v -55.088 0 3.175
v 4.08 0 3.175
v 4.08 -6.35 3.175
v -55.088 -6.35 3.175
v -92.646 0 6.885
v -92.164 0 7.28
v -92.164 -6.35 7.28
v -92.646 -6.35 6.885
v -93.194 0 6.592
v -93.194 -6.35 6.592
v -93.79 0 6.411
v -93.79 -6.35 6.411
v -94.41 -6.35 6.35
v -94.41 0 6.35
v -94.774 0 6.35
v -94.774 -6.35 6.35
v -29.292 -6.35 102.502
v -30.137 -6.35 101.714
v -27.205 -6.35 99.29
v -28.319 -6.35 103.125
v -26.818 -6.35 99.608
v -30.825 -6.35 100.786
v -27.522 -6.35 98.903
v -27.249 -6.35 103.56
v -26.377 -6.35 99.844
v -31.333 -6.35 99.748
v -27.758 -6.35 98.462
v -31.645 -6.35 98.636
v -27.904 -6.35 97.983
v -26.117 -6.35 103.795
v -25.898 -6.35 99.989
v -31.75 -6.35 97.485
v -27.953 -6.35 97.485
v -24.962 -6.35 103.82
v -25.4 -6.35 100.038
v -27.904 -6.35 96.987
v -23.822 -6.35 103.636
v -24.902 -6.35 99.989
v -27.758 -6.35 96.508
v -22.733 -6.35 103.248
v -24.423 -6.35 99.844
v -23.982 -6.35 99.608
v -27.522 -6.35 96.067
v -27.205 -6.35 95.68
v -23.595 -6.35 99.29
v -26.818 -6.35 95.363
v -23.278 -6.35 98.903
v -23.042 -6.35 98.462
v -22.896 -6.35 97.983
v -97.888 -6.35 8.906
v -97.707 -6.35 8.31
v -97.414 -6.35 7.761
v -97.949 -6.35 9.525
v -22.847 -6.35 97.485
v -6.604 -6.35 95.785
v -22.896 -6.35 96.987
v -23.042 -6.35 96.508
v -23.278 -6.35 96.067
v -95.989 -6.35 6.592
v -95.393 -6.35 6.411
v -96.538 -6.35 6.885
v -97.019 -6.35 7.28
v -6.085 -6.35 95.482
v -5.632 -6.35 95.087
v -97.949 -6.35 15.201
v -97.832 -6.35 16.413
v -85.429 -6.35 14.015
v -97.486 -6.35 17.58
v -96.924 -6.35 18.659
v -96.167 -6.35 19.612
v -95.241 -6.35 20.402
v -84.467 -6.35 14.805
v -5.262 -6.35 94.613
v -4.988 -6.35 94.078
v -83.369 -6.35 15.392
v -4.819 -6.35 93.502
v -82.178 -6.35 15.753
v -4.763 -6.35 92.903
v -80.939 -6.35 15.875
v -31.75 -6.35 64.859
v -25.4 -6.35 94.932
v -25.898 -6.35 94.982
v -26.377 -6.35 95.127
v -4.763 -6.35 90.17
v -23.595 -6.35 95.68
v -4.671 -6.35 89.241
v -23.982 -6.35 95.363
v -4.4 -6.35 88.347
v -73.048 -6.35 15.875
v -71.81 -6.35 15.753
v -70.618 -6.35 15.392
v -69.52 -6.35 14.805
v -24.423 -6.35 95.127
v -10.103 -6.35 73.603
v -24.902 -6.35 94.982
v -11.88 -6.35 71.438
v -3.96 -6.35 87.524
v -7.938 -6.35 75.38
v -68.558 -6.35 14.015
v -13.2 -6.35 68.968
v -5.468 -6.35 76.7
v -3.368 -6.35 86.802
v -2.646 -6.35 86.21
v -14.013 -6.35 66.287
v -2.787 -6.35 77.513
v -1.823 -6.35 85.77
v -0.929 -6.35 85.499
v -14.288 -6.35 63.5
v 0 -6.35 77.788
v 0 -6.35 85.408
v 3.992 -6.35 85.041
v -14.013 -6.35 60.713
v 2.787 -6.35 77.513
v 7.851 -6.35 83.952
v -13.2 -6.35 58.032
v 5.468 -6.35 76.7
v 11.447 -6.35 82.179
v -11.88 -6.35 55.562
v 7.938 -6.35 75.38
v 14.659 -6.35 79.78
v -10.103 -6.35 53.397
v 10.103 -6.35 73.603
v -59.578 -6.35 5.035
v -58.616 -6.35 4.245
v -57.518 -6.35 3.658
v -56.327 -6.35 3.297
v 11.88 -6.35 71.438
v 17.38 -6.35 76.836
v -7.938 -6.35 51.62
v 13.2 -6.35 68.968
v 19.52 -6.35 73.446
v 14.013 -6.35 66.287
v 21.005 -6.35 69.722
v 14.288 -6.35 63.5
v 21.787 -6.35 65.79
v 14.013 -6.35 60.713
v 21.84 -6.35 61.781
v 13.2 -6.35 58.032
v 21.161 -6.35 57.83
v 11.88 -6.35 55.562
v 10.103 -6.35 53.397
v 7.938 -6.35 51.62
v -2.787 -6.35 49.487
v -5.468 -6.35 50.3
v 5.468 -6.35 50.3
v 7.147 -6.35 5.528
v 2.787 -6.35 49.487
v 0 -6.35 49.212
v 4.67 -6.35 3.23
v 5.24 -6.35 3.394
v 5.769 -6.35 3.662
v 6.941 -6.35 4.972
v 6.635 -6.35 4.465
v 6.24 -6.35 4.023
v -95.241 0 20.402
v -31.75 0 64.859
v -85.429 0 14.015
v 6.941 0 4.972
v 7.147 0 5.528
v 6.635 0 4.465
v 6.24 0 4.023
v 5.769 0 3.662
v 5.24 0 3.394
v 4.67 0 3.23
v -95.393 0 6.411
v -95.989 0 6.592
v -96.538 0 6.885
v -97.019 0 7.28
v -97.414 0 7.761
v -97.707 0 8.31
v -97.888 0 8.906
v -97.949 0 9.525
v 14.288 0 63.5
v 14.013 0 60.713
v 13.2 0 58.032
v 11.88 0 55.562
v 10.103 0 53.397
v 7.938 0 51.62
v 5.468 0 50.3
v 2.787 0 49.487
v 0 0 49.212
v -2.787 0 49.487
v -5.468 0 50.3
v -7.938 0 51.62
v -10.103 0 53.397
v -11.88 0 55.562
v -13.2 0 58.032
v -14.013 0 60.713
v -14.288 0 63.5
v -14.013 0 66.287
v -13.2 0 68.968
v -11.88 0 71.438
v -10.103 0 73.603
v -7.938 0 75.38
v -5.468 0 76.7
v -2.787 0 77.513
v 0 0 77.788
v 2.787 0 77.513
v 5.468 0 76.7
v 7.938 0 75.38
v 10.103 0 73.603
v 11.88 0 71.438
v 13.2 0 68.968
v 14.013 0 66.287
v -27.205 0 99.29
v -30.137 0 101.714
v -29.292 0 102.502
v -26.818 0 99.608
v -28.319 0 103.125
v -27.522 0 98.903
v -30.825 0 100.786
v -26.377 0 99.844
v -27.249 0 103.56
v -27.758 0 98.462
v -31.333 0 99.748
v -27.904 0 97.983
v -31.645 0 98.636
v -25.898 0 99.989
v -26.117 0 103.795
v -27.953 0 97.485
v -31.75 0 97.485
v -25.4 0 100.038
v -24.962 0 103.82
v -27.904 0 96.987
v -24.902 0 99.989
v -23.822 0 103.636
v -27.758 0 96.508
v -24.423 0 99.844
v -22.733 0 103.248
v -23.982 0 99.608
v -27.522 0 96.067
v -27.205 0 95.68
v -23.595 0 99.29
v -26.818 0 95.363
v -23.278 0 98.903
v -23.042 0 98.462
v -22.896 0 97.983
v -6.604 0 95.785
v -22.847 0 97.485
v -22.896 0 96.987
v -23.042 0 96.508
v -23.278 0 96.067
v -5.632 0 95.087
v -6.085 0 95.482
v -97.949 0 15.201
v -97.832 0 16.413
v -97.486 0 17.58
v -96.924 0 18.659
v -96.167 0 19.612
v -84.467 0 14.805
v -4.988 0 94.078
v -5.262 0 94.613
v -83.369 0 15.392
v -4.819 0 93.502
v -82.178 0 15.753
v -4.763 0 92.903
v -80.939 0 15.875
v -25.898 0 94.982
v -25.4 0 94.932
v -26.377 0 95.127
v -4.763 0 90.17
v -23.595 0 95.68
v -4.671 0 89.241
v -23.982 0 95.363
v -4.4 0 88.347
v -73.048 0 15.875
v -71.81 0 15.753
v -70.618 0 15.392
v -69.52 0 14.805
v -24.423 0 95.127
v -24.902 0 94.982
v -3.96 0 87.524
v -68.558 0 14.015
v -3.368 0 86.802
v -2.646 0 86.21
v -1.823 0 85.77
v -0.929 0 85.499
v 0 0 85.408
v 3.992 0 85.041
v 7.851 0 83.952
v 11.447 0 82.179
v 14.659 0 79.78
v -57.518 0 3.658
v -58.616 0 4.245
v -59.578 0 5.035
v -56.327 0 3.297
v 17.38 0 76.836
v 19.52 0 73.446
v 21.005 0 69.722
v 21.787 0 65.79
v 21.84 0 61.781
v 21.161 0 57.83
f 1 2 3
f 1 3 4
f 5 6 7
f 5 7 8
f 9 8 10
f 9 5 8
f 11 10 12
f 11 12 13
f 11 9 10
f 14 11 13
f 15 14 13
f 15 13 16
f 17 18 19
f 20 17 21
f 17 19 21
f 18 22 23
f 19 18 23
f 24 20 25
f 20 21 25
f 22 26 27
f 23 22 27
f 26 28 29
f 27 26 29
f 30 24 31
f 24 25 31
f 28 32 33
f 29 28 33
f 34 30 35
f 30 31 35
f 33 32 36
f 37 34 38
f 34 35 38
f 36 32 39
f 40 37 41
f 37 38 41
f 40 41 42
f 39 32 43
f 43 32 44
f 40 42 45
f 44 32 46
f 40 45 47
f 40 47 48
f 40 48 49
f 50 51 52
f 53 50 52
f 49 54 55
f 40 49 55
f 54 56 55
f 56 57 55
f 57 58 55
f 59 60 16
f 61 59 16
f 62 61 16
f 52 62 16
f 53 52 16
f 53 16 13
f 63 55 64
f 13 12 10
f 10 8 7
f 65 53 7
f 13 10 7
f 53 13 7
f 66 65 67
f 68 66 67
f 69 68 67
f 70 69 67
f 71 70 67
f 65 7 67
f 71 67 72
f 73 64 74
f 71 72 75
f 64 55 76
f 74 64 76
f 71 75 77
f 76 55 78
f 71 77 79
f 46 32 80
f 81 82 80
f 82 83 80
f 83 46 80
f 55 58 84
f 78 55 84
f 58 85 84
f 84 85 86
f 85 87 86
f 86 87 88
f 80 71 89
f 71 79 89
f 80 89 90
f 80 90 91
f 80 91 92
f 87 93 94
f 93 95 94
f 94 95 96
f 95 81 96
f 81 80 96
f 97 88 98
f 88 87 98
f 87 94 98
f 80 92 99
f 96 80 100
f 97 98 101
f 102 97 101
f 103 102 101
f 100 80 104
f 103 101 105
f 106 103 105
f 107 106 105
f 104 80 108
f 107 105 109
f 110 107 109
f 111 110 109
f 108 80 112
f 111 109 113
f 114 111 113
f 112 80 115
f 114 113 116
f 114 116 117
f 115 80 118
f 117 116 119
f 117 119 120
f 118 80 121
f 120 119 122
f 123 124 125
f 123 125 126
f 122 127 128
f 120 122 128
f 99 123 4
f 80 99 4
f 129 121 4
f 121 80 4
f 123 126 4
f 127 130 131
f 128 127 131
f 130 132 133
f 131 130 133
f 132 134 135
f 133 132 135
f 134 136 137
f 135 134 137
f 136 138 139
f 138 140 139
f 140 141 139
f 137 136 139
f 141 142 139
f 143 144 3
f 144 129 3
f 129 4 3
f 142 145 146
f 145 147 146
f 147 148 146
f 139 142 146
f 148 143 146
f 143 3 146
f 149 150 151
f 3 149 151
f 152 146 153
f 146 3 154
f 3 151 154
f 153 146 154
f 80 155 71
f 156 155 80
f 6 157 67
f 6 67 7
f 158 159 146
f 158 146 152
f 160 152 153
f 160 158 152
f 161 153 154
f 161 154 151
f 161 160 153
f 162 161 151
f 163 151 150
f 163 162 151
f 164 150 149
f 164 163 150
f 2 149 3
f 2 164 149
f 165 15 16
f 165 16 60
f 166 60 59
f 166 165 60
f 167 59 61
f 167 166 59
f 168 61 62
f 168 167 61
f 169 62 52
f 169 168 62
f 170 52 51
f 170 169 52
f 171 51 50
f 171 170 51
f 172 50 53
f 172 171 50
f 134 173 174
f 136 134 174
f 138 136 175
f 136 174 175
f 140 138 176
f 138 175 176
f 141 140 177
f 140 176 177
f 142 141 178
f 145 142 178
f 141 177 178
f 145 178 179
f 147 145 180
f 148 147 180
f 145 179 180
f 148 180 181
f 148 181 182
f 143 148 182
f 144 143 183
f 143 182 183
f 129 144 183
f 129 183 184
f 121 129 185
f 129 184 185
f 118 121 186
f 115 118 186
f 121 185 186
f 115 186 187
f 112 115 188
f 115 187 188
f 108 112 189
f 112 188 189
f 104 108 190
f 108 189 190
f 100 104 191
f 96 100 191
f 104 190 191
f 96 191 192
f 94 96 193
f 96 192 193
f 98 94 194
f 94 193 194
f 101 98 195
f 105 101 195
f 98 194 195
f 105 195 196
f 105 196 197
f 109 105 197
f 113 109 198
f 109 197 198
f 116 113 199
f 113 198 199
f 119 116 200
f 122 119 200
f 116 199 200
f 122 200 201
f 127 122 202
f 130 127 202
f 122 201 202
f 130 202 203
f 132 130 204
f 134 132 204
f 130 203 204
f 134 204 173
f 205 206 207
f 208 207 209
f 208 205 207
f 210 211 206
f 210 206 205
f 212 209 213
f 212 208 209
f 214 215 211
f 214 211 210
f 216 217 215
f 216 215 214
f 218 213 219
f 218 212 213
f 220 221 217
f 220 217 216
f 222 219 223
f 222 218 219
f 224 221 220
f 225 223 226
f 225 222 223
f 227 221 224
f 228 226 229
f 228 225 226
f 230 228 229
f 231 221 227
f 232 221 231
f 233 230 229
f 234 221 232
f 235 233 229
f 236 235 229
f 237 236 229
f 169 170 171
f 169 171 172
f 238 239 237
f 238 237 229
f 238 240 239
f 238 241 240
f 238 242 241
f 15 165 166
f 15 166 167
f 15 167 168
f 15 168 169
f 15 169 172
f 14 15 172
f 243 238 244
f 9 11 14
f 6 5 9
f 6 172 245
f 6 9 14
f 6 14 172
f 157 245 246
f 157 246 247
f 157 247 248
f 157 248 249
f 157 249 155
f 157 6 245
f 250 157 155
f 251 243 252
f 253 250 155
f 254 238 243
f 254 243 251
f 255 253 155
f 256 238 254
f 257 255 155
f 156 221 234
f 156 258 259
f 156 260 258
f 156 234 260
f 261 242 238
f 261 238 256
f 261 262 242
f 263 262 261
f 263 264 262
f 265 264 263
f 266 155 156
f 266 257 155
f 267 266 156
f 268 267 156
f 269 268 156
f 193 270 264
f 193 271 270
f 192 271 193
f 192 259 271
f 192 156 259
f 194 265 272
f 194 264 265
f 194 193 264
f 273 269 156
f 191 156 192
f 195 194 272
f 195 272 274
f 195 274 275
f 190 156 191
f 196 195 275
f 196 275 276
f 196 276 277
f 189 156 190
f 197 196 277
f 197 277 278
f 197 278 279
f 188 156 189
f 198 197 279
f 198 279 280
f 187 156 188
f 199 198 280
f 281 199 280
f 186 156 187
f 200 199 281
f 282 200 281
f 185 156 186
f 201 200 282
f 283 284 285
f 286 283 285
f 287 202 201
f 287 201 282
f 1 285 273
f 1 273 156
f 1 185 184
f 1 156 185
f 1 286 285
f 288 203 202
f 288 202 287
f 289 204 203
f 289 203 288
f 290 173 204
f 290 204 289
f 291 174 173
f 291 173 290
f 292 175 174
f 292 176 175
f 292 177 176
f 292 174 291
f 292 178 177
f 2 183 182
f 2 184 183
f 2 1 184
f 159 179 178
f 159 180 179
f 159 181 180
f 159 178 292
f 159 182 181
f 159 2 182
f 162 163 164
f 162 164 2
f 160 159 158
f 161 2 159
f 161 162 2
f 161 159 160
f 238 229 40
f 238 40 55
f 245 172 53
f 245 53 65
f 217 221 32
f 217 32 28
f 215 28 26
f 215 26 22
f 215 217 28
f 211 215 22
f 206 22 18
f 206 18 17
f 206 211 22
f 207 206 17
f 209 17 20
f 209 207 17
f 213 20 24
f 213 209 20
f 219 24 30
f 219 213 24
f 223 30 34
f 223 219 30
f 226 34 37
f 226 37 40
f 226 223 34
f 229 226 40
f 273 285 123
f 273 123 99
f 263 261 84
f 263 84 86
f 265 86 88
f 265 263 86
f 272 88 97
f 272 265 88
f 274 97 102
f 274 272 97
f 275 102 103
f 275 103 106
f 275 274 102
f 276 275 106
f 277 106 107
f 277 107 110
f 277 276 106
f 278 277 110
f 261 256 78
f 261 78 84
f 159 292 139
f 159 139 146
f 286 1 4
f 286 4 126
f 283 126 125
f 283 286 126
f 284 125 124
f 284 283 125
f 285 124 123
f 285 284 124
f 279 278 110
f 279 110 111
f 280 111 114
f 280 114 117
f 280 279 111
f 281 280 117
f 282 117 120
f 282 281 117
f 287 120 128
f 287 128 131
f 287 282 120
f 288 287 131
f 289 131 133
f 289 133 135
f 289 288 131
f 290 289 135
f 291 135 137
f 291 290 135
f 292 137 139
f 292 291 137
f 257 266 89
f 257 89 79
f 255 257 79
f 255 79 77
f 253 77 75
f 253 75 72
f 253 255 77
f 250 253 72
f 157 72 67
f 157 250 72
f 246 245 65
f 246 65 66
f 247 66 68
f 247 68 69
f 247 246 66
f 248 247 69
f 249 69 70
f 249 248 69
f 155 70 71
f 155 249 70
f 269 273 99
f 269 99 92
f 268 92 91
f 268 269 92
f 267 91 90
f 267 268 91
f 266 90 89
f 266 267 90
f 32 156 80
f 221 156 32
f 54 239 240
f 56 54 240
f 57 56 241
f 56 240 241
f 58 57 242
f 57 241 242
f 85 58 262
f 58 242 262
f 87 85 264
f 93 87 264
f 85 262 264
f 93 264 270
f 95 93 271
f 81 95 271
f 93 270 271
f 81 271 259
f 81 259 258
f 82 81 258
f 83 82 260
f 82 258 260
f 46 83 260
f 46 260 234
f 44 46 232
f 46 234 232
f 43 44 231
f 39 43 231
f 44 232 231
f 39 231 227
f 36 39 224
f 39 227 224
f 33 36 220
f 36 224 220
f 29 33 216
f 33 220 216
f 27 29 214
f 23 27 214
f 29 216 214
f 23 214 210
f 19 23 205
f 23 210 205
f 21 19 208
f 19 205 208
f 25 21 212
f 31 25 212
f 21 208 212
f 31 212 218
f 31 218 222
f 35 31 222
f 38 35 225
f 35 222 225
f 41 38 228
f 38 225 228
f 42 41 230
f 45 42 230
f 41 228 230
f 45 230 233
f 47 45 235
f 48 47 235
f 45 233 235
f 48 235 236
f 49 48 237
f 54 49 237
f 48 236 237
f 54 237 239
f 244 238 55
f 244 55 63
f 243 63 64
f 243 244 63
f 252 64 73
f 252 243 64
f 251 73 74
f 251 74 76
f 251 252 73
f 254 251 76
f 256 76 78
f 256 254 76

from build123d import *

# Parameters (mm, degrees)
SKETCH1_R           = 2.5527
SKETCH1_R_2         = 14.2875
BOSS_EXTRUDE1_DEPTH = 6.35


with BuildPart() as part:
    # Sketch1 → Boss-Extrude1 (new body)
    with BuildSketch(Plane(origin=(0, 0, 0), x_dir=(1, 0, 0), z_dir=(0, 1, 0))):
        with BuildLine():
            Line((4.080014702, -3.175), (-55.087853576, -3.175))
            ThreePointArc((-55.087853576, -3.175), (-57.517893372, -3.658364969), (-59.577981637, -5.034871939))
            Line((-59.577981637, -5.034871939), (-68.558237758, -14.015128061))
            ThreePointArc((-68.558237758, -14.015128061), (-70.618326023, -15.391635031), (-73.048365818, -15.875))
            Line((-73.048365818, -15.875), (-80.939134182, -15.875))
            ThreePointArc((-80.939134182, -15.875), (-83.369173977, -15.391635031), (-85.429262242, -14.015128061))
            Line((-85.429262242, -14.015128061), (-92.164454333, -7.27993597))
            ThreePointArc((-92.164454333, -7.27993597), (-93.194498465, -6.591682484), (-94.409518363, -6.35))
            Line((-94.409518363, -6.35), (-94.77375, -6.35))
            ThreePointArc((-94.77375, -6.35), (-97.01881403, -7.27993597), (-97.94875, -9.525))
            Line((-97.94875, -9.525), (-97.94875, -15.200863174))
            ThreePointArc((-97.94875, -15.200863174), (-97.231268791, -18.132966868), (-95.240960371, -20.402478656))
            Line((-95.240960371, -20.402478656), (-31.75, -64.859327715))
            Line((-31.75, -64.859327715), (-31.75, -97.4852))
            ThreePointArc((-31.75, -97.4852), (-28.819730055, -102.835708981), (-22.733323984, -103.248127991))
            Line((-22.733323984, -103.248127991), (-6.604161992, -95.784691086))
            ThreePointArc((-6.604161992, -95.784691086), (-5.26224551, -94.613092118), (-4.7625, -92.903227091))
            Line((-4.7625, -92.903227091), (-4.7625, -90.17))
            ThreePointArc((-4.7625, -90.17), (-3.367596045, -86.802403955), (0, -85.4075))
            ThreePointArc((0, -85.4075), (17.380388302, -76.836441006), (21.161020039, -57.829921769))
            Line((21.161020039, -57.829921769), (7.146829201, -5.528249532))
            ThreePointArc((7.146829201, -5.528249532), (6.012832239, -3.831103145), (4.080014702, -3.175))
        make_face()
        with Locations((-25.4, -97.4852)):
            Circle(SKETCH1_R, mode=Mode.SUBTRACT)
        with Locations((0, -63.5)):
            Circle(SKETCH1_R_2, mode=Mode.SUBTRACT)
    extrude(amount=-BOSS_EXTRUDE1_DEPTH)


solid = part.part
